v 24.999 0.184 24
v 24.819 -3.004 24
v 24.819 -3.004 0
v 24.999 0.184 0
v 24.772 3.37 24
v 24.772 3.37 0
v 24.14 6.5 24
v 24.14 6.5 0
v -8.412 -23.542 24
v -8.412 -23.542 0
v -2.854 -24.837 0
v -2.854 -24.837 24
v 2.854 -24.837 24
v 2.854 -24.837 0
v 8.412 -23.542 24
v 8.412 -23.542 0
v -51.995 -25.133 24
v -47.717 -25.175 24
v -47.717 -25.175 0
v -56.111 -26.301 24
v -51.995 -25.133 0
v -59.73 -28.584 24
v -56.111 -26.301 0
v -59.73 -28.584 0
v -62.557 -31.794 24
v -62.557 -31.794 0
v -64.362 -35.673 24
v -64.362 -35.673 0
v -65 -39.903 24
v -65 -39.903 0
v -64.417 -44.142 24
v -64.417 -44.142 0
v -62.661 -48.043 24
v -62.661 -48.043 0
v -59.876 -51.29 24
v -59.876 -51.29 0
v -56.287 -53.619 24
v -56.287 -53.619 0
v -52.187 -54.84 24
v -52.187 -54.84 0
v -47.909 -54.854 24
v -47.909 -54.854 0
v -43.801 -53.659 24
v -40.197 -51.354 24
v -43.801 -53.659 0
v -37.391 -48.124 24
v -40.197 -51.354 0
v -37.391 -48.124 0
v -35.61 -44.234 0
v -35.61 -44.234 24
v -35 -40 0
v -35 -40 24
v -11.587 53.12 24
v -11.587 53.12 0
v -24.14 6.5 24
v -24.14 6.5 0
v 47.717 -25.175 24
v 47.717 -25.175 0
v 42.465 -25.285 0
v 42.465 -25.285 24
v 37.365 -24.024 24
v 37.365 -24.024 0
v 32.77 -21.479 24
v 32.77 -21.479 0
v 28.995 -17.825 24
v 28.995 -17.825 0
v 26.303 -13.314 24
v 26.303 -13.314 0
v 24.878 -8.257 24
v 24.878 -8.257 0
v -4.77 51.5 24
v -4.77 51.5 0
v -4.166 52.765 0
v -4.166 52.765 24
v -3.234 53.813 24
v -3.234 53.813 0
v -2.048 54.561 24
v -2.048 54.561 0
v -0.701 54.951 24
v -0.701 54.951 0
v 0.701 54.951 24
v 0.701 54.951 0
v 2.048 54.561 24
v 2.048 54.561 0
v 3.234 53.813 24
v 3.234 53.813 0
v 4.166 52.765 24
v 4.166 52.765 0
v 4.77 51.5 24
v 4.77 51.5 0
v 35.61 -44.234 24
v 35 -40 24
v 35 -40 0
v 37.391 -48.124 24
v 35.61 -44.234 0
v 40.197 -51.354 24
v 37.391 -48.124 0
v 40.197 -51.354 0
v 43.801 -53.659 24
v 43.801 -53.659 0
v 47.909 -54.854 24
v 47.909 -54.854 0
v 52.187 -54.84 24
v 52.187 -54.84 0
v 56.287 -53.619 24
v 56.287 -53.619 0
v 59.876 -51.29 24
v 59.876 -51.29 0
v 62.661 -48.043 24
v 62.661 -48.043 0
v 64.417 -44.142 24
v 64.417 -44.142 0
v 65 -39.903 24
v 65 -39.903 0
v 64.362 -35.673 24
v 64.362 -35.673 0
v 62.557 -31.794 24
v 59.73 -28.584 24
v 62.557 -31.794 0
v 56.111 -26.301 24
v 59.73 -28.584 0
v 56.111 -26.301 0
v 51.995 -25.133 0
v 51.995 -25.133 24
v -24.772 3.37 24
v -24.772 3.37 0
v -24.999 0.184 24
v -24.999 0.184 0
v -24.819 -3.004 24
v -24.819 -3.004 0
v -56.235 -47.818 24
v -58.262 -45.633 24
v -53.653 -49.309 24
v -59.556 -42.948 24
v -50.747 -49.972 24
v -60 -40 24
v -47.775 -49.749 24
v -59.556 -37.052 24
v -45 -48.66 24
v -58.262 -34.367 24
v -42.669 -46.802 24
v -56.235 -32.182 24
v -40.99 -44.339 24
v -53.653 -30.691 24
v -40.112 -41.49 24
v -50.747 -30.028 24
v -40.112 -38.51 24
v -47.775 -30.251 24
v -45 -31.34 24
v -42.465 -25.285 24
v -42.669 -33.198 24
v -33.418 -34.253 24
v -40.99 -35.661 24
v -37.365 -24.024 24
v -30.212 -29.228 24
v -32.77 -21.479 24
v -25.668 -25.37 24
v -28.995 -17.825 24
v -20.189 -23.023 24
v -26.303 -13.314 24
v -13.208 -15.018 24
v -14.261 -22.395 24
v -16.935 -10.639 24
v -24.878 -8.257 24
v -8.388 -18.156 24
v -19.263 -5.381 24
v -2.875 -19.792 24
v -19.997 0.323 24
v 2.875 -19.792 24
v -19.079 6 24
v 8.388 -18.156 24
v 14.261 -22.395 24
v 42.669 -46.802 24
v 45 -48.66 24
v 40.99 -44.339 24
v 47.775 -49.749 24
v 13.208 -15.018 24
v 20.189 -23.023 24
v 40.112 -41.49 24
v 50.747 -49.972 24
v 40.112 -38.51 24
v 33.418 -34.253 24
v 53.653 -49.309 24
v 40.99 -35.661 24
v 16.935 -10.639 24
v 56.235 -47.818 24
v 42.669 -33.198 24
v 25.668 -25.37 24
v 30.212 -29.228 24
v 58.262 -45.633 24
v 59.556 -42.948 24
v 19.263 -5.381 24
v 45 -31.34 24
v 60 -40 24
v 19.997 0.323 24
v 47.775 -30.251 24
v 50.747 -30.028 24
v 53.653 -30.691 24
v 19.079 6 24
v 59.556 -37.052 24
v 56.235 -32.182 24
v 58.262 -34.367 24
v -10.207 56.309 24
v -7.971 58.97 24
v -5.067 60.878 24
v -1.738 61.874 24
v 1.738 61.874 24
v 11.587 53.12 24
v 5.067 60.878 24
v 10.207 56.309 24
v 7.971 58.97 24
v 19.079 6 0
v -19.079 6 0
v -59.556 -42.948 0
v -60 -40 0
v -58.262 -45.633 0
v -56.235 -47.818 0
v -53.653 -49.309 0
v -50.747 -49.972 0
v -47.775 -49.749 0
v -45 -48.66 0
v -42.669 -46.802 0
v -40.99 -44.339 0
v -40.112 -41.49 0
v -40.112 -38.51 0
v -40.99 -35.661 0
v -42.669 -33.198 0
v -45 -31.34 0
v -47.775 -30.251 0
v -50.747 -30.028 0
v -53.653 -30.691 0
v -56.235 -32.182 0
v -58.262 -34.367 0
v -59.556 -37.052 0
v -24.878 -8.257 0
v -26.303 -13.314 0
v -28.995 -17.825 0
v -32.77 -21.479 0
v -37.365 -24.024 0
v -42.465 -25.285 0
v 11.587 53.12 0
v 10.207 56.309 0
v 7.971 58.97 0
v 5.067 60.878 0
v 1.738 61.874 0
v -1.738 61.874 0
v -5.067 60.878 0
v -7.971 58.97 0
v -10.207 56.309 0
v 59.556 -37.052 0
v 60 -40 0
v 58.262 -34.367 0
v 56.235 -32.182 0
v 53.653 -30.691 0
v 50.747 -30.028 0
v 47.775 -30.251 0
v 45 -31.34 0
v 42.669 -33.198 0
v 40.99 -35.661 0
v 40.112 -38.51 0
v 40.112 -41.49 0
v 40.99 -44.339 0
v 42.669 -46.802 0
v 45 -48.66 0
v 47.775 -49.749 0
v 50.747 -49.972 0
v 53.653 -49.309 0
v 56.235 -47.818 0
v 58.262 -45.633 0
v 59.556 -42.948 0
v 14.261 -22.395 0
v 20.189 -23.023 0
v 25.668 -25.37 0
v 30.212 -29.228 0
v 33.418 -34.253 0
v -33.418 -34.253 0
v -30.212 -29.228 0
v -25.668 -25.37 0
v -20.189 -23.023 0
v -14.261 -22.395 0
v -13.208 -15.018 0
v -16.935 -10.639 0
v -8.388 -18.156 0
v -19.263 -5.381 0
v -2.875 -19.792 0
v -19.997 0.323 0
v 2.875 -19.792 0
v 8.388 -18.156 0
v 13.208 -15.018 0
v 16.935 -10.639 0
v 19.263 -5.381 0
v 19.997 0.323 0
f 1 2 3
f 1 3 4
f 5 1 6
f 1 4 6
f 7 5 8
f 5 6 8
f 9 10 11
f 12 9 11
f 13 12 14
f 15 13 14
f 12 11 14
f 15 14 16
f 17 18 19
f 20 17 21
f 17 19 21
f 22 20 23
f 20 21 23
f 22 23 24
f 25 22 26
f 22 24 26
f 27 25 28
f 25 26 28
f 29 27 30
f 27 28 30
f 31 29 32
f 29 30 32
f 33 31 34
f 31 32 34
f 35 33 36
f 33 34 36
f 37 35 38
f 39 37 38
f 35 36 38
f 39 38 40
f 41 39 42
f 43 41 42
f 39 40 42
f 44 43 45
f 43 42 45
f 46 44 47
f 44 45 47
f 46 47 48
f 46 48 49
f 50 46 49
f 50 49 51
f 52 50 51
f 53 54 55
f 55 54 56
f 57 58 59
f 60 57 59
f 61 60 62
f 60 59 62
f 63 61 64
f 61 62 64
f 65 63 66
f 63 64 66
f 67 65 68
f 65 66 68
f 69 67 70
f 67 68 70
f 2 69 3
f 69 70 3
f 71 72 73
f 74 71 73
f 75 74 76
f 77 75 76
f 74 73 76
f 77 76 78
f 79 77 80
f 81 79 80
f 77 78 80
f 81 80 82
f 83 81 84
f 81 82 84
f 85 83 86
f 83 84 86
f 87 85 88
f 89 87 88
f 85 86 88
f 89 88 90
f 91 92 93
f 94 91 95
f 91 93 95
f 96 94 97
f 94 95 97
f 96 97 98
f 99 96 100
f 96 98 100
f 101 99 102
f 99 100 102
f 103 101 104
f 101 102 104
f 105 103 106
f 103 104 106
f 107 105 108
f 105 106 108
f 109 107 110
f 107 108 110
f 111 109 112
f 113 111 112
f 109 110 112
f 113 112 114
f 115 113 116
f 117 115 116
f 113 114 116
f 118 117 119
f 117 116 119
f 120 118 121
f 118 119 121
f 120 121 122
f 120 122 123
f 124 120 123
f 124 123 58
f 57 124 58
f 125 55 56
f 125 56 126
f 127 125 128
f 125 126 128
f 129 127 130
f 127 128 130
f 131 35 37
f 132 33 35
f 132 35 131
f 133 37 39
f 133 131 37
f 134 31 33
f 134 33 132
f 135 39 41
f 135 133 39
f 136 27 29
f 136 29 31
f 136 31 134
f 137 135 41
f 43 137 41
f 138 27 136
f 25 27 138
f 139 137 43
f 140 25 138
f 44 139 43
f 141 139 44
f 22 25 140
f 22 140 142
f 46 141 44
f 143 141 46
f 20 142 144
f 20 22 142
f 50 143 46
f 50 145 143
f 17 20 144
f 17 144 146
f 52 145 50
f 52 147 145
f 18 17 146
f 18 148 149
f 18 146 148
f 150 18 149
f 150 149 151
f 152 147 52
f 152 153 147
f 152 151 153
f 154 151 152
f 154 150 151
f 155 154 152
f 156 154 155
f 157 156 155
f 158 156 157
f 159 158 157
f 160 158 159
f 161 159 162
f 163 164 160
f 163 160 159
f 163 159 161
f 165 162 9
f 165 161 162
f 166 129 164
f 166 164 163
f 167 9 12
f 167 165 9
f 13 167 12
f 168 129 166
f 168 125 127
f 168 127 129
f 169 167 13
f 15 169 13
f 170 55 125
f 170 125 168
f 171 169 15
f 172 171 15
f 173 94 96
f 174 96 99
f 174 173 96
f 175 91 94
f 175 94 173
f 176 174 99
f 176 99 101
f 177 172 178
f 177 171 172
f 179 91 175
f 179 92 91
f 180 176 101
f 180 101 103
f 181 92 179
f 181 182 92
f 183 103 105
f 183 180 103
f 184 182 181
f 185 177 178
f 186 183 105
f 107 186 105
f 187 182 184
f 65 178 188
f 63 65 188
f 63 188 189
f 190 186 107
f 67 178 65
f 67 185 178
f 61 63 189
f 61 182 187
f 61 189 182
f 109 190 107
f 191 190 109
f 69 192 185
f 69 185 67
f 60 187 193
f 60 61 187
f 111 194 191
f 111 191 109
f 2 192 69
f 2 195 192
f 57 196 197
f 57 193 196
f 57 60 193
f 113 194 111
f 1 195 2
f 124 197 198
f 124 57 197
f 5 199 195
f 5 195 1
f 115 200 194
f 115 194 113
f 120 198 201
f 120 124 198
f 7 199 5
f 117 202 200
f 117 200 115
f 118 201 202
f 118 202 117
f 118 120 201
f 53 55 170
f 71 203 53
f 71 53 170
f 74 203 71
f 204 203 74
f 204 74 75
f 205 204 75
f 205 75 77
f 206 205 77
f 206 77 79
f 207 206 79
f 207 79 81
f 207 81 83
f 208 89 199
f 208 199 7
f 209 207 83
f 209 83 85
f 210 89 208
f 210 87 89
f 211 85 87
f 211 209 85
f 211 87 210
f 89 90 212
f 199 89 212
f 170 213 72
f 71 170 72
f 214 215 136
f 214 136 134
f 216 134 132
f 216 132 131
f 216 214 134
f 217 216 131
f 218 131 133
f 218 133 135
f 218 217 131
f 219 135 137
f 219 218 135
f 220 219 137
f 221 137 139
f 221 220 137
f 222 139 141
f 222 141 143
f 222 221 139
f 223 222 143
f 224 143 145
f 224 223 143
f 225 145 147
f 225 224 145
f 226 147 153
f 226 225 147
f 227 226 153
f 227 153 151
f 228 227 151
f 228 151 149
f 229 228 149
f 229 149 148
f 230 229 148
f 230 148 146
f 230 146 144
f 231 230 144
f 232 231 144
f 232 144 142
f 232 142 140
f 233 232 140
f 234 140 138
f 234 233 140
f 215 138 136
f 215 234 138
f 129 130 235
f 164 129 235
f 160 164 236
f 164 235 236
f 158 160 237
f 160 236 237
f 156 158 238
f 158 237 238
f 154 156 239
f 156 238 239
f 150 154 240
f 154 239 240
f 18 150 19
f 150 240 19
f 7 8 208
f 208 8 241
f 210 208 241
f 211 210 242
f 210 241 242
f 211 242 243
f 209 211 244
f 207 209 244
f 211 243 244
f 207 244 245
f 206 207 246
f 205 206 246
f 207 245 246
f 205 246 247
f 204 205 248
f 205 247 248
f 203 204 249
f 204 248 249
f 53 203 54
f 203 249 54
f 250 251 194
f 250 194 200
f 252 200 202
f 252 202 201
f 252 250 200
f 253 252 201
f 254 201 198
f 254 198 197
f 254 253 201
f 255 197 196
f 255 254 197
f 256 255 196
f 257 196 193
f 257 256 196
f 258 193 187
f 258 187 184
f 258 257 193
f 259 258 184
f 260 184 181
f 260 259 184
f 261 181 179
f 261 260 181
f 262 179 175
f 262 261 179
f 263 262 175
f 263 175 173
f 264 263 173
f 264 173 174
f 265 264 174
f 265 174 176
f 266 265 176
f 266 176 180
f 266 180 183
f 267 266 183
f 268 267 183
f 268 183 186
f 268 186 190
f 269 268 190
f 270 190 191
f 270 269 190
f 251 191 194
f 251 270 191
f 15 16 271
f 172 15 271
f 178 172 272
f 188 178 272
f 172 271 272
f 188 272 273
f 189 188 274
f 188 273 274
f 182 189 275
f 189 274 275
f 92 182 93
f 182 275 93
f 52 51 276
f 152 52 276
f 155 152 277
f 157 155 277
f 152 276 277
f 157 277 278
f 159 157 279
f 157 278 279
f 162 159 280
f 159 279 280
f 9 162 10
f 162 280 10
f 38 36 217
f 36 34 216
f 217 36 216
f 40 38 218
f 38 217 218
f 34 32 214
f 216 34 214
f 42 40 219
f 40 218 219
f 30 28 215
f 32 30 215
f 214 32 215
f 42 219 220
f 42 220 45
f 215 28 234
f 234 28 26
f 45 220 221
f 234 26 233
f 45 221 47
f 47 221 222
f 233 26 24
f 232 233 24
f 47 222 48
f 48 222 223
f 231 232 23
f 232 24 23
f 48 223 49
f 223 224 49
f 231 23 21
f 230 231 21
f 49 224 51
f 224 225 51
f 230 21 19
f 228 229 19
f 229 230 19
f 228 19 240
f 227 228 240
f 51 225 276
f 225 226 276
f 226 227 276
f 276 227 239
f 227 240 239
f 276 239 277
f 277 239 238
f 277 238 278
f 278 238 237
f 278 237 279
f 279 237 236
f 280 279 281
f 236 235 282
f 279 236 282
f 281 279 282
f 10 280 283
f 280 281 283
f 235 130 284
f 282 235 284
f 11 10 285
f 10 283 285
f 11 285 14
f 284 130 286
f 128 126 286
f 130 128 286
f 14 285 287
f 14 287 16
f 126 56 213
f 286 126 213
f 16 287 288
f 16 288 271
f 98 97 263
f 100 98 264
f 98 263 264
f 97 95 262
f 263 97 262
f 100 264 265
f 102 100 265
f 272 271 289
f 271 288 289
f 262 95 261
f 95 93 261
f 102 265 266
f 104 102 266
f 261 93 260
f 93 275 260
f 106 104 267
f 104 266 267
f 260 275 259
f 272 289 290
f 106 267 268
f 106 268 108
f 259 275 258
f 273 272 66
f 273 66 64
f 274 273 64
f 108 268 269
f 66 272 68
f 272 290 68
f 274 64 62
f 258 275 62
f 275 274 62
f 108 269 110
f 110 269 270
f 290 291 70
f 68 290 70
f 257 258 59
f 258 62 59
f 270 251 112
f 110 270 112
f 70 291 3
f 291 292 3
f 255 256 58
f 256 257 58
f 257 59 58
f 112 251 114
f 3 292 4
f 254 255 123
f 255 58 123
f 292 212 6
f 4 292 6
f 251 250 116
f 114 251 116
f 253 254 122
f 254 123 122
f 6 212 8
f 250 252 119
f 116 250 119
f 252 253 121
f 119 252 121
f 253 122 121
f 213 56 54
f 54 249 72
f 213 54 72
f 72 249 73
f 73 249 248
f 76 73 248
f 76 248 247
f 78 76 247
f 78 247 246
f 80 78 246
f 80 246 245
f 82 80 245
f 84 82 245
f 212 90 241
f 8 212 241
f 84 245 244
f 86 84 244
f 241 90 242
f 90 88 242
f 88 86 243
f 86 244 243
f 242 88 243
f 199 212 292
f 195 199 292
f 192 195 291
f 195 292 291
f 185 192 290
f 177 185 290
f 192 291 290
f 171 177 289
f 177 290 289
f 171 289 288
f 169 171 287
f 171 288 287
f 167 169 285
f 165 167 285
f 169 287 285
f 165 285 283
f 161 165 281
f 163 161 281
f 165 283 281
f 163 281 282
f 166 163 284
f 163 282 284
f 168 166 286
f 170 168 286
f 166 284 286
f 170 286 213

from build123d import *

# Parameters (mm, degrees)
SKETCH1_R           = 10
BOSS_EXTRUDE1_DEPTH = 24


with BuildPart() as part:
    # Sketch1 → Boss-Extrude1 (new body)
    with BuildSketch(Plane.XY):
        with BuildLine():
            Line((24.140215409, 6.5), (11.587303396, 53.12))
            ThreePointArc((11.587303396, 53.12), (0, 62), (-11.587303396, 53.12))
            Line((-11.587303396, 53.12), (-24.140215409, 6.5))
            ThreePointArc((-24.140215409, 6.5), (-24.936514863, 1.780512988), (-24.81883517, -3.004233816))
            ThreePointArc((-24.81883517, -3.004233816), (-30.762049538, -19.776348187), (-47.717387131, -25.174694658))
            ThreePointArc((-47.717387131, -25.174694658), (-61.385060233, -49.766289136), (-35, -40))
            ThreePointArc((-35, -40), (-25.668051324, -25.370335536), (-8.412024081, -23.542256707))
            ThreePointArc((-8.412024081, -23.542256707), (0, -25), (8.412024081, -23.542256707))
            ThreePointArc((8.412024081, -23.542256707), (25.668051324, -25.370335536), (35, -40))
            ThreePointArc((35, -40), (61.385060233, -49.766289136), (47.717387131, -25.174694658))
            ThreePointArc((47.717387131, -25.174694658), (30.762049538, -19.776348187), (24.81883517, -3.004233816))
            ThreePointArc((24.81883517, -3.004233816), (24.936514863, 1.780512988), (24.140215409, 6.5))
        make_face()
        with Locations((50, -40)):
            Circle(SKETCH1_R, mode=Mode.SUBTRACT)
        with Locations(Location((-50, -40, 0), (0, 0, 180))):
            Circle(SKETCH1_R, mode=Mode.SUBTRACT)
        with BuildLine():
            Line((4.769696007, 51.5), (19.078784028, 6))
            ThreePointArc((19.078784028, 6), (0, -20), (-19.078784028, 6))
            Line((-19.078784028, 6), (-4.769696007, 51.5))
            ThreePointArc((-4.769696007, 51.5), (0, 55), (4.769696007, 51.5))
        make_face(mode=Mode.SUBTRACT)
    extrude(amount=BOSS_EXTRUDE1_DEPTH)


solid = part.part
